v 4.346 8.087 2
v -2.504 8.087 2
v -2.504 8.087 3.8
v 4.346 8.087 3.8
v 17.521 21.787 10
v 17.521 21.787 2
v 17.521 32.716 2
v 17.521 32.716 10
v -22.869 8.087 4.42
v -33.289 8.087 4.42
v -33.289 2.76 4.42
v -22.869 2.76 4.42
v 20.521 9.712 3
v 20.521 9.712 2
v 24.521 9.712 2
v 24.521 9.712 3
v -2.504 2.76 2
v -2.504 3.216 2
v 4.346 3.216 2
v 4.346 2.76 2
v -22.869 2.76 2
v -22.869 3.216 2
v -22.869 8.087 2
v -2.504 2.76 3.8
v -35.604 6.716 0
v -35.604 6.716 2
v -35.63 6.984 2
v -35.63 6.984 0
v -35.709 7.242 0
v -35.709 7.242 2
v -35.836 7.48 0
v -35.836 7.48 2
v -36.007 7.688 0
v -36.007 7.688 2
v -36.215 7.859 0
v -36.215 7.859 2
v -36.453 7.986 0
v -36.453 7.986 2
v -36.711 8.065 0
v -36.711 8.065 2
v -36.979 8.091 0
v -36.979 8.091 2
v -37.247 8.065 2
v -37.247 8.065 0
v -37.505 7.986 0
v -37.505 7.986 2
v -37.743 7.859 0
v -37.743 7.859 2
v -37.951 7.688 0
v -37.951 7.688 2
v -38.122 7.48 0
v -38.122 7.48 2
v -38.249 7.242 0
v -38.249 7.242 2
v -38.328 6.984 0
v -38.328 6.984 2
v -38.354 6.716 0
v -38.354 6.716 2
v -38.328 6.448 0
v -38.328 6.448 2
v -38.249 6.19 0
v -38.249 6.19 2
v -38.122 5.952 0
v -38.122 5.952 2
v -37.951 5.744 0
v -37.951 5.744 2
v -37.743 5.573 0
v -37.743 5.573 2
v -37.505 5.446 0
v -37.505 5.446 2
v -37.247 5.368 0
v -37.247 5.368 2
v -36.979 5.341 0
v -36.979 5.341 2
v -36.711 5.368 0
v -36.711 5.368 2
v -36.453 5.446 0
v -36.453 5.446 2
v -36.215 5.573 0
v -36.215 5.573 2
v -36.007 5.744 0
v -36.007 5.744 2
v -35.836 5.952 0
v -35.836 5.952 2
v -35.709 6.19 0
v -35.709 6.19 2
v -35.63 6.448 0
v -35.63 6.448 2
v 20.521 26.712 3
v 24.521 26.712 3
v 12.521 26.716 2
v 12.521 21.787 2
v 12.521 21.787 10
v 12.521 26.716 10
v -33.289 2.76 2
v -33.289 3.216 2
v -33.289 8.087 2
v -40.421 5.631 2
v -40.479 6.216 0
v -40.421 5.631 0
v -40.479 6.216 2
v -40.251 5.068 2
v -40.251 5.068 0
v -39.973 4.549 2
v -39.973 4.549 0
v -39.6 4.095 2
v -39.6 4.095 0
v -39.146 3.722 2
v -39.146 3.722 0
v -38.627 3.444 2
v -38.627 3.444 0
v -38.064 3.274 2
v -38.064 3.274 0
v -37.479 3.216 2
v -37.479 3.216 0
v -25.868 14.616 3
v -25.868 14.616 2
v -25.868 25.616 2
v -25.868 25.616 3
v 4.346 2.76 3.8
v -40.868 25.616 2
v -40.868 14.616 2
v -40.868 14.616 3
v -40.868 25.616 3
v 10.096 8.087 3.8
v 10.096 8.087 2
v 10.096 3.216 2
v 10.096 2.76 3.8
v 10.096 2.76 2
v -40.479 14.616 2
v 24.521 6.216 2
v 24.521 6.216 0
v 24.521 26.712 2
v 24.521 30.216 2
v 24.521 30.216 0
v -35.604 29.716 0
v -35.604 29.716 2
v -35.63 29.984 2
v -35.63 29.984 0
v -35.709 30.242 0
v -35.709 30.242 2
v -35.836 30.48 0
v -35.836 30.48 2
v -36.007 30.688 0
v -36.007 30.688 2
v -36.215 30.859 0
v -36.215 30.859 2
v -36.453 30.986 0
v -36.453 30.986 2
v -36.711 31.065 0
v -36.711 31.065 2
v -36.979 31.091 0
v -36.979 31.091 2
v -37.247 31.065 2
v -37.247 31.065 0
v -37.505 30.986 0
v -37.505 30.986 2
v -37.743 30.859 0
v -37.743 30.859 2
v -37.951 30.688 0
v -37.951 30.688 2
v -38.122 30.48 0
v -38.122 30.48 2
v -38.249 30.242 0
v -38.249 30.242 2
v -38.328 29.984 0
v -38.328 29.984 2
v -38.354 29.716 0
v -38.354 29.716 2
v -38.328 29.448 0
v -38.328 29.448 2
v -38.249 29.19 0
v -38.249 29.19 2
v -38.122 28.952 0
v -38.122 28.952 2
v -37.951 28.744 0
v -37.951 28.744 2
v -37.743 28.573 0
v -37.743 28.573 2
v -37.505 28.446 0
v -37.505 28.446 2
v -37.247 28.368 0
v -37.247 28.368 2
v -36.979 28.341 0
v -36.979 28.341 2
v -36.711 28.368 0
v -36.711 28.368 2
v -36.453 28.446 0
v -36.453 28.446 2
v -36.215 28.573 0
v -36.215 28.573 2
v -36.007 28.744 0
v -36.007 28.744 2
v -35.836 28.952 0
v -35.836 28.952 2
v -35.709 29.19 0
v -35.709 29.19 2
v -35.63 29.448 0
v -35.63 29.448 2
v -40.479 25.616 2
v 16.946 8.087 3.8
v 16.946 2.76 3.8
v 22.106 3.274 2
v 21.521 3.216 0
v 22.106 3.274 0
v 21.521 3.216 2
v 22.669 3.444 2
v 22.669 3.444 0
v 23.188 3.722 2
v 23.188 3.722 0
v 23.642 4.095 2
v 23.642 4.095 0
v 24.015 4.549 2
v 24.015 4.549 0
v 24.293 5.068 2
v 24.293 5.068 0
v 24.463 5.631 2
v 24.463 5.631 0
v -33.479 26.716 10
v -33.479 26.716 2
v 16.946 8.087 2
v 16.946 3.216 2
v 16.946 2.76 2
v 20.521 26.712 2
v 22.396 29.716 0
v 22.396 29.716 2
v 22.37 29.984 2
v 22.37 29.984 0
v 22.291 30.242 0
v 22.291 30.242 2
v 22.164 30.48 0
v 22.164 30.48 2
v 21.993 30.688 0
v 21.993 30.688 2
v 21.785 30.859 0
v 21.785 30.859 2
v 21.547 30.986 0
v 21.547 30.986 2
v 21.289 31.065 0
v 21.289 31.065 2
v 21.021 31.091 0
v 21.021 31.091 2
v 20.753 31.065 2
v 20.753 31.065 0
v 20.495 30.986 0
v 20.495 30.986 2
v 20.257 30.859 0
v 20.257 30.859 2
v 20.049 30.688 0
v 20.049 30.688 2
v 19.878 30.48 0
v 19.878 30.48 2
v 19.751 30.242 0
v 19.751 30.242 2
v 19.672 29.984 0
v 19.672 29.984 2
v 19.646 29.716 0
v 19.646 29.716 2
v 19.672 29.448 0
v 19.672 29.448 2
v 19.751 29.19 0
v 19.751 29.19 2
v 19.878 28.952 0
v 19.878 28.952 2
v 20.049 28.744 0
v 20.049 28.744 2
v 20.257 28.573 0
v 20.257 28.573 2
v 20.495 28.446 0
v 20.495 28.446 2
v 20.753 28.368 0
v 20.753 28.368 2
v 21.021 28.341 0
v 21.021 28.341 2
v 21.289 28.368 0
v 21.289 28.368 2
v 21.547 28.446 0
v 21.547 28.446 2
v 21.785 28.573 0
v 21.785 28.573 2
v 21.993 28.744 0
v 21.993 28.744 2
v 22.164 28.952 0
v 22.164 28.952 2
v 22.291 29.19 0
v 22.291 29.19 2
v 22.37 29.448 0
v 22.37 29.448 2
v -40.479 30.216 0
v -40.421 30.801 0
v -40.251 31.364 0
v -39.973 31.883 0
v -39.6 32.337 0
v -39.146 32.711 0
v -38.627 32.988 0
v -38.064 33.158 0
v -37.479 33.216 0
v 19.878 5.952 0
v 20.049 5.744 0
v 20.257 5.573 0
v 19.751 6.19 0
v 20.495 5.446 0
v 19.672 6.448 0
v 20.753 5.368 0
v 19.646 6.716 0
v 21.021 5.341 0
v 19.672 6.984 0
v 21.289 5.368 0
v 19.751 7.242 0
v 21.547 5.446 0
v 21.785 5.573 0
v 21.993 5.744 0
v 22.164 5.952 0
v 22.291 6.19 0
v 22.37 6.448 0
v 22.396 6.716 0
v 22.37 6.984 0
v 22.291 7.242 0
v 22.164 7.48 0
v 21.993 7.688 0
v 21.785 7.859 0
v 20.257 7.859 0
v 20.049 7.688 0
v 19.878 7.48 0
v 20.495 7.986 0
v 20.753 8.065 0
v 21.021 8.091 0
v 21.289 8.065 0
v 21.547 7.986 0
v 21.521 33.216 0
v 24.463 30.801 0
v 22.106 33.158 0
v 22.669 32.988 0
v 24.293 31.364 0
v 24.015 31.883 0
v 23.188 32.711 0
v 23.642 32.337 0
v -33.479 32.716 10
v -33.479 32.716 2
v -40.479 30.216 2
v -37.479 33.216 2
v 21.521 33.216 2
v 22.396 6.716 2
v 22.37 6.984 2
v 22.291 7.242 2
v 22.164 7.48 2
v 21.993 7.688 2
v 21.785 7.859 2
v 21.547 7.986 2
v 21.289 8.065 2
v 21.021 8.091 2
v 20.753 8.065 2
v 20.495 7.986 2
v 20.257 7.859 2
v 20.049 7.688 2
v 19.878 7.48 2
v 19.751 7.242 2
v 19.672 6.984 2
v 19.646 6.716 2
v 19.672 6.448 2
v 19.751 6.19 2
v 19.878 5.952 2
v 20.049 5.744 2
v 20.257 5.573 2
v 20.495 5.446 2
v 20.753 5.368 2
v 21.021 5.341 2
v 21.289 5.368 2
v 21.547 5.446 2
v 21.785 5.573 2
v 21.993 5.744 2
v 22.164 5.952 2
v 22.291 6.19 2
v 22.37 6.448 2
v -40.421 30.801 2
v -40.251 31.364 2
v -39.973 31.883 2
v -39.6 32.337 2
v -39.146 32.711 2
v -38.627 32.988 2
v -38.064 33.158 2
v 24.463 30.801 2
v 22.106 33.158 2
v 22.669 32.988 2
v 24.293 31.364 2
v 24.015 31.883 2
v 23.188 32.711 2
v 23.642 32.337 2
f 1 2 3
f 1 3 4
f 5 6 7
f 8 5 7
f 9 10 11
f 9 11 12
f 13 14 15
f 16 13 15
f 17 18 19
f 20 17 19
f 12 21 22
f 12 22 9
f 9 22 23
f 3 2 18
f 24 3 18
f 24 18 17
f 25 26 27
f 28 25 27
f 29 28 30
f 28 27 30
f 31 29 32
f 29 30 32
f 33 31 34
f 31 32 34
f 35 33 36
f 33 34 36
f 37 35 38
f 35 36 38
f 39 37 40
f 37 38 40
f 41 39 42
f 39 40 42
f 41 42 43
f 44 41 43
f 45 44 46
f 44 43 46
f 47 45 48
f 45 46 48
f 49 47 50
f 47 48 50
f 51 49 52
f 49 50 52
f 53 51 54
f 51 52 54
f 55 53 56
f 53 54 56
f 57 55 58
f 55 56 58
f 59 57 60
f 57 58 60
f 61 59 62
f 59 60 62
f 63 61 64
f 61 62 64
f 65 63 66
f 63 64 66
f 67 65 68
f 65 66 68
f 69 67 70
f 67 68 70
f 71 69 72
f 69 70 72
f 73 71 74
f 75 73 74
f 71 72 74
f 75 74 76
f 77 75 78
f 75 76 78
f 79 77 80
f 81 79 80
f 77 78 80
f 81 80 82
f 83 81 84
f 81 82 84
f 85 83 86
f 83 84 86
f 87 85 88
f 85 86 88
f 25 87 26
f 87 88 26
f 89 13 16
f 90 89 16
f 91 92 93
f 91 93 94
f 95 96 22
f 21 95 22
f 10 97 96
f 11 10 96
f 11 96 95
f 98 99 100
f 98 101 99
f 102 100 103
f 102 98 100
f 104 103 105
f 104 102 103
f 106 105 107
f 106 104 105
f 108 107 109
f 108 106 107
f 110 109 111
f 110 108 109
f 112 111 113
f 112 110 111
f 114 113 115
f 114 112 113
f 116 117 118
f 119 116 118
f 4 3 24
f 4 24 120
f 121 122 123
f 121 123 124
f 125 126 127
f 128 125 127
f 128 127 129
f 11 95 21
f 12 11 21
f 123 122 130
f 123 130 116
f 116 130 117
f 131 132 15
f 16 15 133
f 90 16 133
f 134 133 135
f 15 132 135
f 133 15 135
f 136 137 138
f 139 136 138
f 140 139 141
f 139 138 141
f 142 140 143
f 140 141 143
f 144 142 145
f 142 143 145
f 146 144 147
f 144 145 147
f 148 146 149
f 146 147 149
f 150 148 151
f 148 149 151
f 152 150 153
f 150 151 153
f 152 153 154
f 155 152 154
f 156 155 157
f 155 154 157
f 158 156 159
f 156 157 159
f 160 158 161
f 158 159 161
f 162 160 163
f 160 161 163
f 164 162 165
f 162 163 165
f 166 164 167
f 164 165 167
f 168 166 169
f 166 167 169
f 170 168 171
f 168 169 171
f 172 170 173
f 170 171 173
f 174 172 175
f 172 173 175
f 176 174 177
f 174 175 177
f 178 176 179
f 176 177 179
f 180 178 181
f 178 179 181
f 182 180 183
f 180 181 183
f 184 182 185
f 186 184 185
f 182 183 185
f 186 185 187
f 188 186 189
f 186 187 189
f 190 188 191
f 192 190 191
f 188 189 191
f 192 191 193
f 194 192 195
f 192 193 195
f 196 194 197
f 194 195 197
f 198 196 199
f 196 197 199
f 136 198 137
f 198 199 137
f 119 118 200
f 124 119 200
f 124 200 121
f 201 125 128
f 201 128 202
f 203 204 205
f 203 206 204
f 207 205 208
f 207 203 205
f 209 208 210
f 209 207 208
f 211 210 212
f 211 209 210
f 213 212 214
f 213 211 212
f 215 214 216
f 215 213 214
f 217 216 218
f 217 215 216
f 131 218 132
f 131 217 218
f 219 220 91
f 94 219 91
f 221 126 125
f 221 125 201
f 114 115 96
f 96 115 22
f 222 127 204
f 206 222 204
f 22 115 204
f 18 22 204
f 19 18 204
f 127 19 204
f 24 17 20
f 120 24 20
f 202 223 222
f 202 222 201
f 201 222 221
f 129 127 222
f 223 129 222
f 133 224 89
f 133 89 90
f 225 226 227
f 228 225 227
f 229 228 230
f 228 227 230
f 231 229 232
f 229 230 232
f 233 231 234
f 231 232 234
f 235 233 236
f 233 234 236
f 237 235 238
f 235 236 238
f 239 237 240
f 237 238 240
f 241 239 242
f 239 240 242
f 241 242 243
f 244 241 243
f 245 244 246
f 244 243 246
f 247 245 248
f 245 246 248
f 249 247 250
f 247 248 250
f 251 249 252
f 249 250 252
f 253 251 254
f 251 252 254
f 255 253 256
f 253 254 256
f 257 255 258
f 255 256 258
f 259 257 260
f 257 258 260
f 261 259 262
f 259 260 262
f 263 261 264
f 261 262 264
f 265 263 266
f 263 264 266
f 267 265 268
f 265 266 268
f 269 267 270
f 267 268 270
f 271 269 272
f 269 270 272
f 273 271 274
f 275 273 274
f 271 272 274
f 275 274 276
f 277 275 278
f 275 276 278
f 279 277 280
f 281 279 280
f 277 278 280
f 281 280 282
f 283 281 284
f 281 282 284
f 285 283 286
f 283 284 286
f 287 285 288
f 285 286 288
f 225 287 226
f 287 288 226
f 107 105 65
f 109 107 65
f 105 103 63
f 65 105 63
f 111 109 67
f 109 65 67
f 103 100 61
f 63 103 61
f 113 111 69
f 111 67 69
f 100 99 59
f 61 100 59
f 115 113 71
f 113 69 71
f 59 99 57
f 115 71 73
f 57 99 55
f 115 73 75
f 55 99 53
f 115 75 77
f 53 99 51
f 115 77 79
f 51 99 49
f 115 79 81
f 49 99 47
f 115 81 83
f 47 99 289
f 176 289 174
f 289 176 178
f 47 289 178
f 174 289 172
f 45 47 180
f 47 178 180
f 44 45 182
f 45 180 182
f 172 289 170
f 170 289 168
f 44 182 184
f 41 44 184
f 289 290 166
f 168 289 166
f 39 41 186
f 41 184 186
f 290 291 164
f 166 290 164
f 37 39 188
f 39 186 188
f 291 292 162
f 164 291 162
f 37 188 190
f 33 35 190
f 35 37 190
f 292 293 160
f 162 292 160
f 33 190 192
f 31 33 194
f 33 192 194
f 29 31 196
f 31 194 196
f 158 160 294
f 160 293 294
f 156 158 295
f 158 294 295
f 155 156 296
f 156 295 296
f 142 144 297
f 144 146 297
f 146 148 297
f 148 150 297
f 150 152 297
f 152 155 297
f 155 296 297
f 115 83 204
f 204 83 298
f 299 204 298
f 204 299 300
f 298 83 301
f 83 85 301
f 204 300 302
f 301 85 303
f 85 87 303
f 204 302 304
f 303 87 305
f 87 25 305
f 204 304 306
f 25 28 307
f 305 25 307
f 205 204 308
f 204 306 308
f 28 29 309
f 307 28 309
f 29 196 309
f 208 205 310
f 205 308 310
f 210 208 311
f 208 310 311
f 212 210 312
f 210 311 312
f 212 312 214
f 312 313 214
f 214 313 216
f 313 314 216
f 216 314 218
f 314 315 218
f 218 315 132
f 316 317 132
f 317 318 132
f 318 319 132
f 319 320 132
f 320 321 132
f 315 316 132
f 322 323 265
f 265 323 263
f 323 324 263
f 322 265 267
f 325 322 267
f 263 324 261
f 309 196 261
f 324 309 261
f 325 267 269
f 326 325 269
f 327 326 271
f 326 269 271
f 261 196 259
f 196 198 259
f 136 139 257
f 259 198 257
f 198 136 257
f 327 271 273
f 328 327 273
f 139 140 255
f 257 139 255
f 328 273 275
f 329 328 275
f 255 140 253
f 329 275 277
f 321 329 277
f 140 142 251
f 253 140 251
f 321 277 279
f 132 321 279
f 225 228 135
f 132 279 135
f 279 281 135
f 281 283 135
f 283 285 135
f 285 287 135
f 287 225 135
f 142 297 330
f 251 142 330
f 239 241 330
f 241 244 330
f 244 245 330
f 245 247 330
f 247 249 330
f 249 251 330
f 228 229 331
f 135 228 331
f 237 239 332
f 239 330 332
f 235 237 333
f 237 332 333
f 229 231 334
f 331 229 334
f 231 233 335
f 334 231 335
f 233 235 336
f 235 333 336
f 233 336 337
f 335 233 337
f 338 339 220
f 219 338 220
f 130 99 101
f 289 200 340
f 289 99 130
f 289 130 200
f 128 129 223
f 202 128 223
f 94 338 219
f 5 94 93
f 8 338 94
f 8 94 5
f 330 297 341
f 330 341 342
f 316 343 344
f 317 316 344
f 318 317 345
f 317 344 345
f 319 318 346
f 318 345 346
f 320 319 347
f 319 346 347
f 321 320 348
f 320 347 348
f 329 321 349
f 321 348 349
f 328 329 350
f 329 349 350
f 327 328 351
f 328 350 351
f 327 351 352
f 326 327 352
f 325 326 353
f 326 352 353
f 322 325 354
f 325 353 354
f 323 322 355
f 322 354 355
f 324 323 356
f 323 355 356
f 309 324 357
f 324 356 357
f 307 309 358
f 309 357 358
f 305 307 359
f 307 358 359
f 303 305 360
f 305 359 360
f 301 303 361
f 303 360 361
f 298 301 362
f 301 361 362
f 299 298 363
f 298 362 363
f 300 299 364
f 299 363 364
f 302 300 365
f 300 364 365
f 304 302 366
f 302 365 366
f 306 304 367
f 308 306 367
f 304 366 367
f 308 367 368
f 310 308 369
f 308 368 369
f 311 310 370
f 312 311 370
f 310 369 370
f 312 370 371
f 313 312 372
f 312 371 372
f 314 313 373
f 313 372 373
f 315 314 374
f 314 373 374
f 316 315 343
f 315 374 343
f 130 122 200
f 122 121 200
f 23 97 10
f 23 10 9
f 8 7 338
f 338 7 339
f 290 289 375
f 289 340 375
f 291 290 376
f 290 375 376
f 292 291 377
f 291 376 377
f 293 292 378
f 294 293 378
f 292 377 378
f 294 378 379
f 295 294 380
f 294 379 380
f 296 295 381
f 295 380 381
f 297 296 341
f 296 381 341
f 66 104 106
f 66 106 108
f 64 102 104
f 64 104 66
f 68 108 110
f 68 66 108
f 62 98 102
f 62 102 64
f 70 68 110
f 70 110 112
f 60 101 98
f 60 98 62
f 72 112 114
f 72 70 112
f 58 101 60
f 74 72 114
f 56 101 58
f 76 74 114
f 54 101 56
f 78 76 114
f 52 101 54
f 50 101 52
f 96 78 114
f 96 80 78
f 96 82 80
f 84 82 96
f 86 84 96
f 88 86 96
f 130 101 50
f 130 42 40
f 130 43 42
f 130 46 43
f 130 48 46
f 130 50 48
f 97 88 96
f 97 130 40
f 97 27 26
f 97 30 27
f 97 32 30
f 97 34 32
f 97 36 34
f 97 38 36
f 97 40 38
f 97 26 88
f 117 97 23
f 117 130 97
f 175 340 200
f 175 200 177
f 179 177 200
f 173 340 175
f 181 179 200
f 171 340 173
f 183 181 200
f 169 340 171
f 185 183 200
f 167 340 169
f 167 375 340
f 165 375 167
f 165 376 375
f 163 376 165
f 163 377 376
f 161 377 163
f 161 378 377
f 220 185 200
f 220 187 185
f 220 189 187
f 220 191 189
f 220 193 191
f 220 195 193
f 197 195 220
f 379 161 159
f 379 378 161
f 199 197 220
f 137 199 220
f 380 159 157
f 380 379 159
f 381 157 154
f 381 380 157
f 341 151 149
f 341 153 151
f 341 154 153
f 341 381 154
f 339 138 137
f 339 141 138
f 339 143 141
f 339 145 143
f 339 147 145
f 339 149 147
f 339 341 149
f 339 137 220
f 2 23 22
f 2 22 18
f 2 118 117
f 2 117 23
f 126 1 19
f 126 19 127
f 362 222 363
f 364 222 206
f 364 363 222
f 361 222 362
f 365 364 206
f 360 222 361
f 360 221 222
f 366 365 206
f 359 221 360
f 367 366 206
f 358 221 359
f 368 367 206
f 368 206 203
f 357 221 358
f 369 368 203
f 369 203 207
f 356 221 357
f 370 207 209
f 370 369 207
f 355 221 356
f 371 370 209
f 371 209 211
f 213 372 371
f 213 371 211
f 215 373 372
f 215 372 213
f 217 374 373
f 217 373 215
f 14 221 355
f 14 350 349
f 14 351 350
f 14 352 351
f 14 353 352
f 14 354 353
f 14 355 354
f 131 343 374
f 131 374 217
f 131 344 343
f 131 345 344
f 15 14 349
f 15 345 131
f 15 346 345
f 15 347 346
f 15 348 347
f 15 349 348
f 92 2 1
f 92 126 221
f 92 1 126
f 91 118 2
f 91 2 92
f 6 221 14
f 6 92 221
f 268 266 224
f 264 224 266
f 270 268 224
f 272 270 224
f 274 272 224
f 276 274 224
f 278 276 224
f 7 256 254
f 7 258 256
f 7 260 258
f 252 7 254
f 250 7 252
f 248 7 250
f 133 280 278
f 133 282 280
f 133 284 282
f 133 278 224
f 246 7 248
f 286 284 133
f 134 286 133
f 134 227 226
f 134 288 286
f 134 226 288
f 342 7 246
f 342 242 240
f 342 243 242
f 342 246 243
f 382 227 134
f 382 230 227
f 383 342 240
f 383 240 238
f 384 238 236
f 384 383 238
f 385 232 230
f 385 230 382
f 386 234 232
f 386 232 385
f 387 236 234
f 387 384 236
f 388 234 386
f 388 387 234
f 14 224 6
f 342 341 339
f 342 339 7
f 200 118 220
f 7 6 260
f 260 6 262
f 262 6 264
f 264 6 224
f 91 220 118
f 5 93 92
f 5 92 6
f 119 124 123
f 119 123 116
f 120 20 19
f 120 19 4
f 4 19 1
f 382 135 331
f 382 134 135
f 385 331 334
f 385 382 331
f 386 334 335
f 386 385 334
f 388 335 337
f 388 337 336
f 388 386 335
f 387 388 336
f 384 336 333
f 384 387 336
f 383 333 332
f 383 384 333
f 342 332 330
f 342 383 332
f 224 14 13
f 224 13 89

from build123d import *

# Parameters (mm, degrees)
F0_W      = 65
F0_H      = 30
F2_DEPTH  = 2
F3_R      = 3
F4_R      = 1.375
F5_DEPTH  = 2
F8_W      = 10.42
F8_H      = 4.8704799486
F8_H_2    = 0.4562667193
F9_DEPTH  = 2.42
F8_W_2    = 6.85
F10_DEPTH = 1.8
F8_W_3    = 14.6107960276
F8_H_3    = 11
F8_W_4    = 0.3892039724
F11_DEPTH = 1
F8_W_5    = 4
F8_H_4    = 17
F12_DEPTH = 1
F13_W     = 5
F13_H     = 4.9290289432
F15_DEPTH = 8


with BuildPart() as f2:
    # F0 (on Top) → F2 (new body)
    with BuildSketch(Plane.XY):
        with Locations((-7.9789588384, 18.2161135599)):
            Rectangle(F0_W, F0_H)
    extrude(amount=F2_DEPTH)

    # F3
    f3_edges = [f2.edges().sort_by_distance(p)[0] for p in [
        (-40.478959, 33.216114, 1),
        (-40.478959, 3.216114, 1),
        (24.521041, 3.216114, 1),
        (24.521041, 33.216114, 1),
    ]]
    fillet(f3_edges, radius=F3_R)

    # F4 (on face) → F5 (cut)
    with BuildSketch(Plane.XY.offset(2)):
        with Locations((21.0210420191, 29.7161135823)):
            Circle(F4_R)
        with Locations((-36.9789588384, 6.7161135599)):
            Circle(F4_R)
        with Locations((-36.9789588384, 29.7161135823)):
            Circle(F4_R)
        with Locations((21.0210411616, 6.7161135599)):
            Circle(F4_R)
    extrude(amount=-F5_DEPTH, mode=Mode.SUBTRACT)

    # F8 (on face) → F9 (join)
    with BuildSketch(Plane.XY.offset(2)):
        with Locations((-28.0789588384, 5.6513535342)):
            Rectangle(F8_W, F8_H)
        with Locations((-28.0789588384, 2.9879802003)):
            Rectangle(F8_W, F8_H_2)
    extrude(amount=F9_DEPTH)

    # F8 (on face) → F10 (join)
    with BuildSketch(Plane.XY.offset(2)):
        with Locations((0.9210411616, 5.6513535342)):
            Rectangle(F8_W_2, F8_H)
        with Locations((13.5210411616, 5.6513535342)):
            Rectangle(F8_W_2, F8_H)
        with Locations((0.9210411616, 2.9879802003)):
            Rectangle(F8_W_2, F8_H_2)
        with Locations((13.5210411616, 2.9879802003)):
            Rectangle(F8_W_2, F8_H_2)
    extrude(amount=F10_DEPTH)

    # F8 (on face) → F11 (join)
    with BuildSketch(Plane.XY.offset(2)):
        with Locations((-33.1735608246, 20.1161135599)):
            Rectangle(F8_W_3, F8_H_3)
        with Locations((-40.6735608246, 20.1161135599)):
            Rectangle(F8_W_4, F8_H_3)
    extrude(amount=F11_DEPTH)

    # F8 (on face) → F12 (join)
    with BuildSketch(Plane.XY.offset(2)):
        with Locations((22.5210411616, 18.2120301798)):
            Rectangle(F8_W_5, F8_H_4)
    extrude(amount=F12_DEPTH)

    # F13 (on face) → F15 (join)
    with BuildSketch(Plane.XY.offset(2)):
        Polygon((12.5210411616, 26.7161135823), (17.5210411616, 26.7161135823), (17.5210411616, 32.7161135823), (-33.4789588384, 32.7161135823), (-33.4789588384, 26.7161135823), align=None)
        with Locations((15.0210411616, 24.2515991107)):
            Rectangle(F13_W, F13_H)
    extrude(amount=F15_DEPTH)


solid = f2.part
